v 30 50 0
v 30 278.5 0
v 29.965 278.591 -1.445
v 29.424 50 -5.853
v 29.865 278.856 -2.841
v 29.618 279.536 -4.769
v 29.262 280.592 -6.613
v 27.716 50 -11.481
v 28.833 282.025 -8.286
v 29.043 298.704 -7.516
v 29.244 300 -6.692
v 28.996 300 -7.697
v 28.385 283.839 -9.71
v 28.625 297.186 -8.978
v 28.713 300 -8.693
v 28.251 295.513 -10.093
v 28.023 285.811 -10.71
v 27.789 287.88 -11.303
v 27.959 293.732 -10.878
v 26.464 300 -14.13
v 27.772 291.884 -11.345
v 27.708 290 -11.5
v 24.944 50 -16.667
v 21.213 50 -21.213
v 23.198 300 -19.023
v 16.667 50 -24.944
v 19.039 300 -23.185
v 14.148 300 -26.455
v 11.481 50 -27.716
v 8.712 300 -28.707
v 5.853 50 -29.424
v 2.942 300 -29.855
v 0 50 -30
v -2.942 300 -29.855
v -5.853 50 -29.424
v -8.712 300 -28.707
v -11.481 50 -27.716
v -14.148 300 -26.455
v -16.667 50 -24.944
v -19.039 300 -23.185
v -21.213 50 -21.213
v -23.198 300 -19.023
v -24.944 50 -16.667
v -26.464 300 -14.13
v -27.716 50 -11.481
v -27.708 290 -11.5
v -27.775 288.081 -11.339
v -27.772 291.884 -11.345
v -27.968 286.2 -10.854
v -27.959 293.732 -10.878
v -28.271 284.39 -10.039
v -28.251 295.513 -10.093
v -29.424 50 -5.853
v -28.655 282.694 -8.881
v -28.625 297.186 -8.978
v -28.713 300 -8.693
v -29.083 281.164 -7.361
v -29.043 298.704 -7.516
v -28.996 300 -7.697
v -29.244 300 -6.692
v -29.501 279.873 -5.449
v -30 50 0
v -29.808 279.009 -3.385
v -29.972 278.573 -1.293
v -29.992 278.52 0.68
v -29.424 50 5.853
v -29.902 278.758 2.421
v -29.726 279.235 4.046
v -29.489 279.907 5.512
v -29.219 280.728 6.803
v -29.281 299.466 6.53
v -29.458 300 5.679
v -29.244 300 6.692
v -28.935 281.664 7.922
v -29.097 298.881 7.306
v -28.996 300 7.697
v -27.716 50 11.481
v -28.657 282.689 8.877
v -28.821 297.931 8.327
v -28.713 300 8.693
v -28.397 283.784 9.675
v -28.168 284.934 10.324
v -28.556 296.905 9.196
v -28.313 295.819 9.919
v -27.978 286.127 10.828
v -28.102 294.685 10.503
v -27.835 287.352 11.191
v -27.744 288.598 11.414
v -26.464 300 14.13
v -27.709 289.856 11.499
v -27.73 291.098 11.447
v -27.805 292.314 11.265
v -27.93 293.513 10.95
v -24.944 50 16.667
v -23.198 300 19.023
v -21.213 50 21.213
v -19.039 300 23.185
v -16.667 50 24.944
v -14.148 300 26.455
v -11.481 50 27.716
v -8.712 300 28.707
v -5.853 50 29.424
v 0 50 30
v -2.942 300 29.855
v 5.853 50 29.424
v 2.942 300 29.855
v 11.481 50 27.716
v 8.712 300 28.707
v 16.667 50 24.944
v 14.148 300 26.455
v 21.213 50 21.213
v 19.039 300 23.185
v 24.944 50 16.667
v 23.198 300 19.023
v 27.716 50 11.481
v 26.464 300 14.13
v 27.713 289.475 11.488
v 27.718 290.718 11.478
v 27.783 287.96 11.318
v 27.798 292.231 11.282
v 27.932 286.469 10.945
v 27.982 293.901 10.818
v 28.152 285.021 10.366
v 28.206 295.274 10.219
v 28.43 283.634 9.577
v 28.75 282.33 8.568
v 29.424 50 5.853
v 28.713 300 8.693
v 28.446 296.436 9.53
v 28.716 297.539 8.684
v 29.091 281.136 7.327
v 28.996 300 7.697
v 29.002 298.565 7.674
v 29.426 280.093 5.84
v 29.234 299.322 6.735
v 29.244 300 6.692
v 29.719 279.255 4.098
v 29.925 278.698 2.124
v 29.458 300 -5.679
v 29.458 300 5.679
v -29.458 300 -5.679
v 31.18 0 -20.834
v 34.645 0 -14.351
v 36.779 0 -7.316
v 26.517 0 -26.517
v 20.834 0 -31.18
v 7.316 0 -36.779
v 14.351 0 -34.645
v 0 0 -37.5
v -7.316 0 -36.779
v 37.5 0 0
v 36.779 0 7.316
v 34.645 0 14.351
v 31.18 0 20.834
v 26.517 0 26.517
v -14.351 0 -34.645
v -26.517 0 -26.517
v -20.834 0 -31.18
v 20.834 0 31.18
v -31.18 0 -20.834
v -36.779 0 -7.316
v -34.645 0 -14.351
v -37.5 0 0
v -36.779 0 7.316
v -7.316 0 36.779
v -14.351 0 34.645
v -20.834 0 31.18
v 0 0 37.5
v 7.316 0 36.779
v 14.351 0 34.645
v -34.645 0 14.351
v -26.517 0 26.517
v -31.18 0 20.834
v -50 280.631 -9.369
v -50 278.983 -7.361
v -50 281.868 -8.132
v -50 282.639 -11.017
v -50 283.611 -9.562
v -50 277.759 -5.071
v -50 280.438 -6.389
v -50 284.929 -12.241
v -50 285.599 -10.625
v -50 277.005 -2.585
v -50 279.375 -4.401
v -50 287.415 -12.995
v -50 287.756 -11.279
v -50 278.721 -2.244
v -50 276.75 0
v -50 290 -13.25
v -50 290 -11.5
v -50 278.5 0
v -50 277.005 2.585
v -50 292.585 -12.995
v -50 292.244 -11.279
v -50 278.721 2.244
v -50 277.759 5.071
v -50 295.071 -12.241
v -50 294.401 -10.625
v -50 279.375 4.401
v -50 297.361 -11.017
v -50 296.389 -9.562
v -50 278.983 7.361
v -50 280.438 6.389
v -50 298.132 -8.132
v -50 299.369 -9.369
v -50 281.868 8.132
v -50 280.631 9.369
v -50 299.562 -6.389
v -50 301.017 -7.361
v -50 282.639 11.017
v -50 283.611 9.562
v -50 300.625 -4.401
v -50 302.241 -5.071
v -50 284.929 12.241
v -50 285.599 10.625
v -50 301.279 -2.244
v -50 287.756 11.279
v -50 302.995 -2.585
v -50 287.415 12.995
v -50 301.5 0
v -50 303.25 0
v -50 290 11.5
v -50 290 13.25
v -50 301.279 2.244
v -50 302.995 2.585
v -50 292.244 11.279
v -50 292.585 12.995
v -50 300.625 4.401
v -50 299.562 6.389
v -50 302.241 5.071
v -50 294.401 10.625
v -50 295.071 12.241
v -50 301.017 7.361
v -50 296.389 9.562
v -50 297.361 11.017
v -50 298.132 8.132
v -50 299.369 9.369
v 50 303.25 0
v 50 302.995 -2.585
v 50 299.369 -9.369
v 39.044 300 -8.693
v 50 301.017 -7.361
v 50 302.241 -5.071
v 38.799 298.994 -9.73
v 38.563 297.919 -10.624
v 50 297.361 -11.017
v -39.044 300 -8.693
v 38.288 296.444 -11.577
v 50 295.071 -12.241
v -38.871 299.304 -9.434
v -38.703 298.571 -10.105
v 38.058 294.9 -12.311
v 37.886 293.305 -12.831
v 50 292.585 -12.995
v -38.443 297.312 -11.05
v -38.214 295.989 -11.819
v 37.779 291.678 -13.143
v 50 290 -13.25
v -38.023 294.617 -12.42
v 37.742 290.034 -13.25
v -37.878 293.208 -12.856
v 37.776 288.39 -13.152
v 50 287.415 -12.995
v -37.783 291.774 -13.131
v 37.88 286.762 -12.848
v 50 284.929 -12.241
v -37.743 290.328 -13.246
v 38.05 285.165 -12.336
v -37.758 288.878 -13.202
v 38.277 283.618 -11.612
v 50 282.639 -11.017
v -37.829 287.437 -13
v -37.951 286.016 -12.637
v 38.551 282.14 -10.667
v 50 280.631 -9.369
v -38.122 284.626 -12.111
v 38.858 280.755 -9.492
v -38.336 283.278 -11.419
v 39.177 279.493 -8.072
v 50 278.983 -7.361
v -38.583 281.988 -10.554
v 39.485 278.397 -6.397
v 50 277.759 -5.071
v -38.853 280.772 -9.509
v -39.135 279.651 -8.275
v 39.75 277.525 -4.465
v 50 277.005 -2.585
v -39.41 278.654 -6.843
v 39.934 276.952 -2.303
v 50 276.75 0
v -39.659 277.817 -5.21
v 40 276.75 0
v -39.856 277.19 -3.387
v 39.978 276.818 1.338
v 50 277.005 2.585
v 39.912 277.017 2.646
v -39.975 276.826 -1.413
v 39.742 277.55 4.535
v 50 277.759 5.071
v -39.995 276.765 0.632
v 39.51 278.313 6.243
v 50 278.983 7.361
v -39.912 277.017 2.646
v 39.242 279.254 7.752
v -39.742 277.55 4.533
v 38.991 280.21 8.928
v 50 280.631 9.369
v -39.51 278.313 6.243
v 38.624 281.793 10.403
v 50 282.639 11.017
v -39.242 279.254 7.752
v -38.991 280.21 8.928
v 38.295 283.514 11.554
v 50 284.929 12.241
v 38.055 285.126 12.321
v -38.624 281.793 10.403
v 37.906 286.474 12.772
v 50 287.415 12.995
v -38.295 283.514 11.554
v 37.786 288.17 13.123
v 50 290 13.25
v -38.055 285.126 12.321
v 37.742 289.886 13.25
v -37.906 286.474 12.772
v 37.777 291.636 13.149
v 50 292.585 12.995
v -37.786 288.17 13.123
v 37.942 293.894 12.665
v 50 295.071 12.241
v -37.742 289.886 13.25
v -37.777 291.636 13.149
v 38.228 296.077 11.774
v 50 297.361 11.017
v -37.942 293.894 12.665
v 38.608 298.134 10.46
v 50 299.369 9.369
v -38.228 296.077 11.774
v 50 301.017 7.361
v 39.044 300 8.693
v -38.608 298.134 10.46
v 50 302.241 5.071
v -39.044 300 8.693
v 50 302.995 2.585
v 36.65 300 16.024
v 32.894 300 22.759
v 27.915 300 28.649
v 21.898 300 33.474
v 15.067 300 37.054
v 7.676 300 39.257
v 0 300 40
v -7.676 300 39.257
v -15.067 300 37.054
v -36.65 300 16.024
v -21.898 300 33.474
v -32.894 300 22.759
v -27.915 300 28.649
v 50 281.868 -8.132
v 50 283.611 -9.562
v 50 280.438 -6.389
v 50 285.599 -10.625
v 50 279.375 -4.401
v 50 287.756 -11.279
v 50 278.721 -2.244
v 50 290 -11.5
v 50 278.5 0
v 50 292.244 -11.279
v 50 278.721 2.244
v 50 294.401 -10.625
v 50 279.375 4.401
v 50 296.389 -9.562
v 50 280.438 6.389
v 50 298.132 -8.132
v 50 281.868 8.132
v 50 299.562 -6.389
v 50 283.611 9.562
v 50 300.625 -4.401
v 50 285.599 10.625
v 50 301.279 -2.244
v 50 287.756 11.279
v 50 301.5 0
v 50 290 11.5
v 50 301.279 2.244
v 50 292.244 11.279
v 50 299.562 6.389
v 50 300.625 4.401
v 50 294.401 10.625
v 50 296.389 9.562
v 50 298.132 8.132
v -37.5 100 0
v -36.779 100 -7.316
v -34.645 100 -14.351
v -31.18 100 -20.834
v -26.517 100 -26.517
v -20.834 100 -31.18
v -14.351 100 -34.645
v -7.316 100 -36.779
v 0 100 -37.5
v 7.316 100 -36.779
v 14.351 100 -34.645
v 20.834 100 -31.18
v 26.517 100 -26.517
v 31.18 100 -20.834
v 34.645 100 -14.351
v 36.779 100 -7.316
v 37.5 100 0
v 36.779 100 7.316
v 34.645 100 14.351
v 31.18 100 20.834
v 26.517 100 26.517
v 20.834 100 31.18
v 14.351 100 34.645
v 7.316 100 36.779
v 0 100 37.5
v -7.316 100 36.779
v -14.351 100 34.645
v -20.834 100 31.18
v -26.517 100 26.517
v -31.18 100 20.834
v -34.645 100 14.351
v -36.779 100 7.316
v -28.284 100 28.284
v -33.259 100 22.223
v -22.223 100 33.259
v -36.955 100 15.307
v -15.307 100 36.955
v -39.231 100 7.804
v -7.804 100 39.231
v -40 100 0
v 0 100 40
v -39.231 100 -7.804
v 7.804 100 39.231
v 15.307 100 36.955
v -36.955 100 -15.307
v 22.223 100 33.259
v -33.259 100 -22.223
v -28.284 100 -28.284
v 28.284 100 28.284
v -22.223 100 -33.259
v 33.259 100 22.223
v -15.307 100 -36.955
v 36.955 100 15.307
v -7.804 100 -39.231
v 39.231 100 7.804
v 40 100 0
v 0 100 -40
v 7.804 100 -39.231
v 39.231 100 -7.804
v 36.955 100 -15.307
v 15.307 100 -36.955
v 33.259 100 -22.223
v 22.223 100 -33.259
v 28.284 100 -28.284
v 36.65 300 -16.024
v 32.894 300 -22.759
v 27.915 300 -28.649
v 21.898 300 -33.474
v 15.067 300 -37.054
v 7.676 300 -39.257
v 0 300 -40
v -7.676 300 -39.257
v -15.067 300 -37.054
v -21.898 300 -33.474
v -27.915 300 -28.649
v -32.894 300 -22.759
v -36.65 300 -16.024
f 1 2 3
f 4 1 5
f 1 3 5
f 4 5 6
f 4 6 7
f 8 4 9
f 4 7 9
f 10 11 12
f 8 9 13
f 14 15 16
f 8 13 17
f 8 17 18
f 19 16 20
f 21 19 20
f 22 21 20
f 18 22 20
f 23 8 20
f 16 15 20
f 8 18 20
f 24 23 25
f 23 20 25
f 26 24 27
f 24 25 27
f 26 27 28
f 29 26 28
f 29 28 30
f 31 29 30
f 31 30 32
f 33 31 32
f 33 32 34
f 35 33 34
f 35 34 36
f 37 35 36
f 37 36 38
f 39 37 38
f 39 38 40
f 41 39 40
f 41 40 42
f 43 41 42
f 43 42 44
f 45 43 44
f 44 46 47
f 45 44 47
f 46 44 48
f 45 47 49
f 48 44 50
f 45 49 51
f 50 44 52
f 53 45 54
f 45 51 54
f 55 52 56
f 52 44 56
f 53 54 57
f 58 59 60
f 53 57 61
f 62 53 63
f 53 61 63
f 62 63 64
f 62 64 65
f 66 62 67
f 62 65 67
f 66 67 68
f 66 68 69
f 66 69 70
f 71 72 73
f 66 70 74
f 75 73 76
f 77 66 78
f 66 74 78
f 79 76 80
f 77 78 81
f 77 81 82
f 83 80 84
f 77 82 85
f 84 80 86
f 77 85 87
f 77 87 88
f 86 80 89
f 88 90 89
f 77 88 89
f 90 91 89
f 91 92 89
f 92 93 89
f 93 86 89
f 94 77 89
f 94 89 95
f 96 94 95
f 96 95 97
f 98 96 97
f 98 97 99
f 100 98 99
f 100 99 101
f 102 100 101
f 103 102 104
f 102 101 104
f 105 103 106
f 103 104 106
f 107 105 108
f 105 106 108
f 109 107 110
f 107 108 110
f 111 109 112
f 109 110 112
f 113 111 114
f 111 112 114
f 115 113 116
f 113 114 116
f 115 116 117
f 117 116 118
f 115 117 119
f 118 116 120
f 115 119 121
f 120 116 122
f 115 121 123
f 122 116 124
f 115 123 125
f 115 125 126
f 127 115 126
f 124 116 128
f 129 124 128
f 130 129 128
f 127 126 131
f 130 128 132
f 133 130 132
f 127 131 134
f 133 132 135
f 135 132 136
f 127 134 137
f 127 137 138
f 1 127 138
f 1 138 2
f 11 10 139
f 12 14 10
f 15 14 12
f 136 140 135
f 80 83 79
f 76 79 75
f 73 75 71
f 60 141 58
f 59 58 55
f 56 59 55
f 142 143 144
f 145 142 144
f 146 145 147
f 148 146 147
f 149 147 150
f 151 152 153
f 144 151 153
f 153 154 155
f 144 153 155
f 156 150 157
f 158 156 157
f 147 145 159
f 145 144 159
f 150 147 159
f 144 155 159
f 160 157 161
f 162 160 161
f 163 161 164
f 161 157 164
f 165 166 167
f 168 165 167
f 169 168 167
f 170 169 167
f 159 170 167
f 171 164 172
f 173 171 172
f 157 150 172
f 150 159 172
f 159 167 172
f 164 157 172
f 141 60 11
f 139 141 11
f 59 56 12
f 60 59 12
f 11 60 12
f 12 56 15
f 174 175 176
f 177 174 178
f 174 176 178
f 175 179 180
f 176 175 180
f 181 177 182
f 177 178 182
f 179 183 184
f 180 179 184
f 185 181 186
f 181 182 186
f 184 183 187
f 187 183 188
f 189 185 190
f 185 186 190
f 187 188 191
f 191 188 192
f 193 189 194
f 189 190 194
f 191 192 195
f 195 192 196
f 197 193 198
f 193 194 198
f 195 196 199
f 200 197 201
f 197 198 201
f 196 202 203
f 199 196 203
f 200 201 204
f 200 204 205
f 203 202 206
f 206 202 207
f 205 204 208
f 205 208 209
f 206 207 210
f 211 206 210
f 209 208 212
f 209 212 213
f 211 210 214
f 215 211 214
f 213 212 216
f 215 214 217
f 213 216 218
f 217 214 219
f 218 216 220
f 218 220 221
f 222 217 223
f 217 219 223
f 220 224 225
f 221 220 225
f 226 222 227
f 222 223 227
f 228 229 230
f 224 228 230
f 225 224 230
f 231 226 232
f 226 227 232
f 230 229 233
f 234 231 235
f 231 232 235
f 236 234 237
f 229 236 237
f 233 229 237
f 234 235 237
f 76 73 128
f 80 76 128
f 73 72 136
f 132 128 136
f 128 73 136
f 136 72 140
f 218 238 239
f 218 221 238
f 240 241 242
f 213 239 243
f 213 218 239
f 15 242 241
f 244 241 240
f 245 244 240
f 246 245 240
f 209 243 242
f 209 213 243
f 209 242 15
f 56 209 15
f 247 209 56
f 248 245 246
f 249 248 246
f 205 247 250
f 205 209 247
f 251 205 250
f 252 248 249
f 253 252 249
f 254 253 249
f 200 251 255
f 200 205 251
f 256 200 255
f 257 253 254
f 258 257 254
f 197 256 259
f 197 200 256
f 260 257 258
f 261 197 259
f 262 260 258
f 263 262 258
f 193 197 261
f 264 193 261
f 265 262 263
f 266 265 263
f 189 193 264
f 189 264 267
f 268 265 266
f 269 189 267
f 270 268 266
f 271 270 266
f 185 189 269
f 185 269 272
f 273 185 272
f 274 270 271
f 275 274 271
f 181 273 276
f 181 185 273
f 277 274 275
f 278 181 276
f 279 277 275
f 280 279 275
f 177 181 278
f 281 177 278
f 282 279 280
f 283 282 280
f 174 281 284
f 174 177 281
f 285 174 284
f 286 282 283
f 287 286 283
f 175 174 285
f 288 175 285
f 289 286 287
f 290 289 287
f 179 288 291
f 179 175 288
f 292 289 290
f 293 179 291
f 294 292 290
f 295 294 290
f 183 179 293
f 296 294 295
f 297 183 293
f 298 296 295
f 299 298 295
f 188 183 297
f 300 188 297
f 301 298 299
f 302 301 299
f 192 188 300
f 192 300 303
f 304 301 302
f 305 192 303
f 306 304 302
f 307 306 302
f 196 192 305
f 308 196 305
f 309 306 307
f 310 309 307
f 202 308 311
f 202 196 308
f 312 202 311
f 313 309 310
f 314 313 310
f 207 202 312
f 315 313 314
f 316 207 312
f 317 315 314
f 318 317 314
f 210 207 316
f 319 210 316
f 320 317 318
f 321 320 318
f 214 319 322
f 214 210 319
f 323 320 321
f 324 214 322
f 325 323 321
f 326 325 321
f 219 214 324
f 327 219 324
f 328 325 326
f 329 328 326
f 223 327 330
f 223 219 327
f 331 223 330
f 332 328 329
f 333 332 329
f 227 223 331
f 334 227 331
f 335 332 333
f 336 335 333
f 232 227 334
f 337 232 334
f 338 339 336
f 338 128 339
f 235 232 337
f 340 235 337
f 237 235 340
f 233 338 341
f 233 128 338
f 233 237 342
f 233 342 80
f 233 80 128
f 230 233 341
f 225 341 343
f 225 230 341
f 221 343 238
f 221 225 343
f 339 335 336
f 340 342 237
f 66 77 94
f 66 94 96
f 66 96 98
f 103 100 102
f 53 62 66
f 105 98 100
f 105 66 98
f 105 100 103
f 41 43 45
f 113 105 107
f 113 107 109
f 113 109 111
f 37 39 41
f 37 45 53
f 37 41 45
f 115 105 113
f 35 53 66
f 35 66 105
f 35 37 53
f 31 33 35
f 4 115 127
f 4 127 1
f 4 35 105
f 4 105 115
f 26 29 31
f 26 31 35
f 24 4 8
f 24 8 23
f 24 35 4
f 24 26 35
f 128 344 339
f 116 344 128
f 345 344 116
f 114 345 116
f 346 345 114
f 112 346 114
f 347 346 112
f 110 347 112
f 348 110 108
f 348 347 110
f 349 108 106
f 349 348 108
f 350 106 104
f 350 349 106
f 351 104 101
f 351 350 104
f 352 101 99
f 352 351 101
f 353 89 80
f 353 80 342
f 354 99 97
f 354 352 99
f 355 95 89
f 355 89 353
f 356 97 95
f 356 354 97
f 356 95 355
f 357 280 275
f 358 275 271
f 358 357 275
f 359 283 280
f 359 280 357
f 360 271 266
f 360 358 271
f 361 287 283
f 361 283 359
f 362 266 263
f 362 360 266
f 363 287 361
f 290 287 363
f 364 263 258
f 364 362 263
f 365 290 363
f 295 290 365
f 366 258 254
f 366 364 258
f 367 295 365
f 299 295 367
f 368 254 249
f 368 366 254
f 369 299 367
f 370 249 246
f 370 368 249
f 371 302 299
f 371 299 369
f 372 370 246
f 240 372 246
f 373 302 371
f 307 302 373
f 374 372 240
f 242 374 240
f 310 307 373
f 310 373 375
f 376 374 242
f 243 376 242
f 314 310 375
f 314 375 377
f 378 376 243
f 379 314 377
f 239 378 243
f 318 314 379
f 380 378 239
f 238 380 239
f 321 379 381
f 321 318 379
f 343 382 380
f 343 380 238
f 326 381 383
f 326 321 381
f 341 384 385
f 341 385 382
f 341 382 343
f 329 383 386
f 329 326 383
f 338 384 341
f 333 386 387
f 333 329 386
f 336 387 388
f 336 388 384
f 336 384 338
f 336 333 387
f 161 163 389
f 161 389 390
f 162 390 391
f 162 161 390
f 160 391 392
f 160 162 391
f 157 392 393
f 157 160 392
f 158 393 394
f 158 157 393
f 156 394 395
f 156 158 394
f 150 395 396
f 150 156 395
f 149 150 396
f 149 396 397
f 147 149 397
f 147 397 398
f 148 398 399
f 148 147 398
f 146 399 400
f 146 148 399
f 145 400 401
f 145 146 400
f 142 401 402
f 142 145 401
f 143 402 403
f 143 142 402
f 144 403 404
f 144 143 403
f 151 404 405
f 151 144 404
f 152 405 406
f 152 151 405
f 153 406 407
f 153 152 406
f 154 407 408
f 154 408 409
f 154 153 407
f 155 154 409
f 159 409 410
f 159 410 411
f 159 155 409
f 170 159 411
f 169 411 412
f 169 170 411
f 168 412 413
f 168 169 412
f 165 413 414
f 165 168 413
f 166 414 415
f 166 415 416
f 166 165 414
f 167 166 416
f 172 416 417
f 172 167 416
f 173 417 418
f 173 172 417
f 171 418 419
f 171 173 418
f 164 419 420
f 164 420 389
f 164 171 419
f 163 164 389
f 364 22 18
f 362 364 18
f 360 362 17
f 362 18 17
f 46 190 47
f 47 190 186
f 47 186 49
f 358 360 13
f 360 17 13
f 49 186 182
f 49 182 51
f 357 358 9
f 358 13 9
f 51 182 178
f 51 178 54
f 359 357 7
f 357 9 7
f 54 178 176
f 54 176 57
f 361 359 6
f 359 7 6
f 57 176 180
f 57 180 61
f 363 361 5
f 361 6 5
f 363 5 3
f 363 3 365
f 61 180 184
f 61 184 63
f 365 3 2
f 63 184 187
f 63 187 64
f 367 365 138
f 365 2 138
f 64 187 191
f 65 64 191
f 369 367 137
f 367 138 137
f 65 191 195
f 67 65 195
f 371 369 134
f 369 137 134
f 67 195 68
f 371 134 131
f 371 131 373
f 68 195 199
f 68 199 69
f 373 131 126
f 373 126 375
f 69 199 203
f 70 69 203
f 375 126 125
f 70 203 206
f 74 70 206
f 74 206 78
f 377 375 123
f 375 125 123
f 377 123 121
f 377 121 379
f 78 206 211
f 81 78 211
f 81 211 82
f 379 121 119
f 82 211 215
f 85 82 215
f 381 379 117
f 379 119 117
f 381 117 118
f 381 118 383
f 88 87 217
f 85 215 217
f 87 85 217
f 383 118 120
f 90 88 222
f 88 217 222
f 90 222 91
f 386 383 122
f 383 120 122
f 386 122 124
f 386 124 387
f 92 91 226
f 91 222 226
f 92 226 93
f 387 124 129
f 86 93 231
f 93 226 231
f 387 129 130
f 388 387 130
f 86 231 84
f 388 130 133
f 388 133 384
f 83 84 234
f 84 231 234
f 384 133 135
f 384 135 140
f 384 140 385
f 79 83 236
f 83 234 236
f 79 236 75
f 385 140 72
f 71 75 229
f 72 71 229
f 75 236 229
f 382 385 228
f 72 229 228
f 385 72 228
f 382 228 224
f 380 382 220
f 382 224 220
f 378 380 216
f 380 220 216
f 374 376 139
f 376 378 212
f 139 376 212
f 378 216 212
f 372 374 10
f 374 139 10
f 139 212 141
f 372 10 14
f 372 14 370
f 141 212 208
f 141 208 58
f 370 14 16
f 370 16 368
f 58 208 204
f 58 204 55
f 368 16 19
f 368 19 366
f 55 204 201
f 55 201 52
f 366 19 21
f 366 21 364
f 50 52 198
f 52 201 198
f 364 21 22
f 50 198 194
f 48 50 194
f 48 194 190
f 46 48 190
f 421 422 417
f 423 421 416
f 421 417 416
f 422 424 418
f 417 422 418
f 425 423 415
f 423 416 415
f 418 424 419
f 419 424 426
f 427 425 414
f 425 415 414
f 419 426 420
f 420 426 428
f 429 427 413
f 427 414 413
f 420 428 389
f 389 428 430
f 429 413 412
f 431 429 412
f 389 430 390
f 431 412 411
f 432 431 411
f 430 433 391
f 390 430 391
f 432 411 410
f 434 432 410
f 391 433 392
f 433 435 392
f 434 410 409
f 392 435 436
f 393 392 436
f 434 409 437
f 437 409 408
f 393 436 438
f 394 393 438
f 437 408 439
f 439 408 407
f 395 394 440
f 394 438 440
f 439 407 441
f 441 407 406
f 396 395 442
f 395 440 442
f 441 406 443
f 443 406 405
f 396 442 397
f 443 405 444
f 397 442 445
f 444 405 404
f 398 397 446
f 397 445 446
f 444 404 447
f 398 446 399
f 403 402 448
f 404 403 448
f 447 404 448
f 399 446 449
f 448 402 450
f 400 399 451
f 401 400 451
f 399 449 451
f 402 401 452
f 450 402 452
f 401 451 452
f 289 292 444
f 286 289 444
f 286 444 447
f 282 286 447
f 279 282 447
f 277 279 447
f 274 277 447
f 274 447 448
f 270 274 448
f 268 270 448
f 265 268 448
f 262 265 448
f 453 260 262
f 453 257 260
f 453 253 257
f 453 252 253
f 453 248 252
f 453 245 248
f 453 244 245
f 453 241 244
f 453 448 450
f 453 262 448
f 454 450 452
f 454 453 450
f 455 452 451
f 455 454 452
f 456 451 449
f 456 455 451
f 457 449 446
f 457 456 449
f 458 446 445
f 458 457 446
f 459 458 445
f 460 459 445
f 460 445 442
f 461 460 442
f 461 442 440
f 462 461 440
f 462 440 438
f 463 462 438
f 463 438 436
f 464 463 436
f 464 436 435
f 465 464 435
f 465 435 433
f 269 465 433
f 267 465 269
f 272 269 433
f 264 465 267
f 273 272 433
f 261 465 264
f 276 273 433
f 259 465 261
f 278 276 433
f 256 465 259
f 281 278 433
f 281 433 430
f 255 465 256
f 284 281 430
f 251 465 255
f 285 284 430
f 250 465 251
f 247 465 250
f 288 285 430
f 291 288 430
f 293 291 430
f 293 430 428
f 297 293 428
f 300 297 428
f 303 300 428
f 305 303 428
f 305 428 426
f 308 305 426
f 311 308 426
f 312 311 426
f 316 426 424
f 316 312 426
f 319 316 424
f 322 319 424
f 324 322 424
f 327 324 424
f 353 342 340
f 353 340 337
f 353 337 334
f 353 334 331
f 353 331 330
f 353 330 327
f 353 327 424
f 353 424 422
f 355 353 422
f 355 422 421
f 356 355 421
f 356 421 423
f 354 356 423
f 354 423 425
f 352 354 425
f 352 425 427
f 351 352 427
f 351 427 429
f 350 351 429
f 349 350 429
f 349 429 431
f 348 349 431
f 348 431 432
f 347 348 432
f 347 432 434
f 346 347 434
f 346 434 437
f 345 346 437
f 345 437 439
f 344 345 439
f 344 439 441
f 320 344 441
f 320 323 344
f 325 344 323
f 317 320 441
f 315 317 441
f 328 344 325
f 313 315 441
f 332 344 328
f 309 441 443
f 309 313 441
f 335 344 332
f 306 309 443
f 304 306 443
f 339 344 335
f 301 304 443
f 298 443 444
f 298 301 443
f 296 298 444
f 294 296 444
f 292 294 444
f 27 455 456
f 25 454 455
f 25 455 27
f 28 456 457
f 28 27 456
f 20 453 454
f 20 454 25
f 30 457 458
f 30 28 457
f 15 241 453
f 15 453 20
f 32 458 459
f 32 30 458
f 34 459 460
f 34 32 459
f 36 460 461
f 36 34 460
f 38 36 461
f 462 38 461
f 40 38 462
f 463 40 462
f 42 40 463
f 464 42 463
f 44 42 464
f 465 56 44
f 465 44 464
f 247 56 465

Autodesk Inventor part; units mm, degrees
ref_plane "YZ Plane" through (0, 0, 0) normal (1, 0, 0) x (0, 1, 0)
ref_plane "XZ Plane" through (0, 0, 0) normal (0, 1, 0) x (-1, 0, 0)
ref_plane "XY Plane" through (0, 0, 0) normal (0, 0, 1) x (1, 0, 0)
sketch "Sketch1" plane through (0, 0, 0) normal (0, 1, 0) x (-1, 0, 0)
  circle A0 centre (0, 0) radius 37.5
  dimension "d0" = 75
extrude "Extrusion1" add sketch "Sketch1" along normal blind 300
sketch "Sketch2" plane through (0, 0, 0) normal (1, 0, 0) x (0, 1, 0)
  circle A0 centre (290, 0) radius 13.25
  line L0 (0, -37.5) -> (0, 37.5) projected
  point P0 (0, 0)
  dimension "d3" = 290
  dimension "d4" = 26.5
extrude "Extrusion2" add sketch "Sketch2" along normal mid plane 100
sketch "Sketch4" plane through (0, 300, 0) normal (0, 1, 0) x (1, 0, 0)
  circle A0 centre (0, 0) radius 40
  dimension "d9" = 80
extrude "Extrusion4" add sketch "Sketch4" against normal blind 200
sketch "Sketch5" plane through (0, 300, 0) normal (0, 1, 0) x (1, 0, 0)
  circle A0 centre (0, 0) radius 30
  dimension "d12" = 60
extrude "Extrusion5" cut sketch "Sketch5" against normal blind 250
sketch "Sketch6" plane through (50, 290, 0) normal (1, 0, 0) x (0, 0, -1)
  circle A0 centre (0, 0) radius 13.25 projected
  point P0 (0, -290)
hole "Hole1" at (50, 290, 0) direction (-1, 0, 0) diameter 23 end through all
properties part number "Water pump"
